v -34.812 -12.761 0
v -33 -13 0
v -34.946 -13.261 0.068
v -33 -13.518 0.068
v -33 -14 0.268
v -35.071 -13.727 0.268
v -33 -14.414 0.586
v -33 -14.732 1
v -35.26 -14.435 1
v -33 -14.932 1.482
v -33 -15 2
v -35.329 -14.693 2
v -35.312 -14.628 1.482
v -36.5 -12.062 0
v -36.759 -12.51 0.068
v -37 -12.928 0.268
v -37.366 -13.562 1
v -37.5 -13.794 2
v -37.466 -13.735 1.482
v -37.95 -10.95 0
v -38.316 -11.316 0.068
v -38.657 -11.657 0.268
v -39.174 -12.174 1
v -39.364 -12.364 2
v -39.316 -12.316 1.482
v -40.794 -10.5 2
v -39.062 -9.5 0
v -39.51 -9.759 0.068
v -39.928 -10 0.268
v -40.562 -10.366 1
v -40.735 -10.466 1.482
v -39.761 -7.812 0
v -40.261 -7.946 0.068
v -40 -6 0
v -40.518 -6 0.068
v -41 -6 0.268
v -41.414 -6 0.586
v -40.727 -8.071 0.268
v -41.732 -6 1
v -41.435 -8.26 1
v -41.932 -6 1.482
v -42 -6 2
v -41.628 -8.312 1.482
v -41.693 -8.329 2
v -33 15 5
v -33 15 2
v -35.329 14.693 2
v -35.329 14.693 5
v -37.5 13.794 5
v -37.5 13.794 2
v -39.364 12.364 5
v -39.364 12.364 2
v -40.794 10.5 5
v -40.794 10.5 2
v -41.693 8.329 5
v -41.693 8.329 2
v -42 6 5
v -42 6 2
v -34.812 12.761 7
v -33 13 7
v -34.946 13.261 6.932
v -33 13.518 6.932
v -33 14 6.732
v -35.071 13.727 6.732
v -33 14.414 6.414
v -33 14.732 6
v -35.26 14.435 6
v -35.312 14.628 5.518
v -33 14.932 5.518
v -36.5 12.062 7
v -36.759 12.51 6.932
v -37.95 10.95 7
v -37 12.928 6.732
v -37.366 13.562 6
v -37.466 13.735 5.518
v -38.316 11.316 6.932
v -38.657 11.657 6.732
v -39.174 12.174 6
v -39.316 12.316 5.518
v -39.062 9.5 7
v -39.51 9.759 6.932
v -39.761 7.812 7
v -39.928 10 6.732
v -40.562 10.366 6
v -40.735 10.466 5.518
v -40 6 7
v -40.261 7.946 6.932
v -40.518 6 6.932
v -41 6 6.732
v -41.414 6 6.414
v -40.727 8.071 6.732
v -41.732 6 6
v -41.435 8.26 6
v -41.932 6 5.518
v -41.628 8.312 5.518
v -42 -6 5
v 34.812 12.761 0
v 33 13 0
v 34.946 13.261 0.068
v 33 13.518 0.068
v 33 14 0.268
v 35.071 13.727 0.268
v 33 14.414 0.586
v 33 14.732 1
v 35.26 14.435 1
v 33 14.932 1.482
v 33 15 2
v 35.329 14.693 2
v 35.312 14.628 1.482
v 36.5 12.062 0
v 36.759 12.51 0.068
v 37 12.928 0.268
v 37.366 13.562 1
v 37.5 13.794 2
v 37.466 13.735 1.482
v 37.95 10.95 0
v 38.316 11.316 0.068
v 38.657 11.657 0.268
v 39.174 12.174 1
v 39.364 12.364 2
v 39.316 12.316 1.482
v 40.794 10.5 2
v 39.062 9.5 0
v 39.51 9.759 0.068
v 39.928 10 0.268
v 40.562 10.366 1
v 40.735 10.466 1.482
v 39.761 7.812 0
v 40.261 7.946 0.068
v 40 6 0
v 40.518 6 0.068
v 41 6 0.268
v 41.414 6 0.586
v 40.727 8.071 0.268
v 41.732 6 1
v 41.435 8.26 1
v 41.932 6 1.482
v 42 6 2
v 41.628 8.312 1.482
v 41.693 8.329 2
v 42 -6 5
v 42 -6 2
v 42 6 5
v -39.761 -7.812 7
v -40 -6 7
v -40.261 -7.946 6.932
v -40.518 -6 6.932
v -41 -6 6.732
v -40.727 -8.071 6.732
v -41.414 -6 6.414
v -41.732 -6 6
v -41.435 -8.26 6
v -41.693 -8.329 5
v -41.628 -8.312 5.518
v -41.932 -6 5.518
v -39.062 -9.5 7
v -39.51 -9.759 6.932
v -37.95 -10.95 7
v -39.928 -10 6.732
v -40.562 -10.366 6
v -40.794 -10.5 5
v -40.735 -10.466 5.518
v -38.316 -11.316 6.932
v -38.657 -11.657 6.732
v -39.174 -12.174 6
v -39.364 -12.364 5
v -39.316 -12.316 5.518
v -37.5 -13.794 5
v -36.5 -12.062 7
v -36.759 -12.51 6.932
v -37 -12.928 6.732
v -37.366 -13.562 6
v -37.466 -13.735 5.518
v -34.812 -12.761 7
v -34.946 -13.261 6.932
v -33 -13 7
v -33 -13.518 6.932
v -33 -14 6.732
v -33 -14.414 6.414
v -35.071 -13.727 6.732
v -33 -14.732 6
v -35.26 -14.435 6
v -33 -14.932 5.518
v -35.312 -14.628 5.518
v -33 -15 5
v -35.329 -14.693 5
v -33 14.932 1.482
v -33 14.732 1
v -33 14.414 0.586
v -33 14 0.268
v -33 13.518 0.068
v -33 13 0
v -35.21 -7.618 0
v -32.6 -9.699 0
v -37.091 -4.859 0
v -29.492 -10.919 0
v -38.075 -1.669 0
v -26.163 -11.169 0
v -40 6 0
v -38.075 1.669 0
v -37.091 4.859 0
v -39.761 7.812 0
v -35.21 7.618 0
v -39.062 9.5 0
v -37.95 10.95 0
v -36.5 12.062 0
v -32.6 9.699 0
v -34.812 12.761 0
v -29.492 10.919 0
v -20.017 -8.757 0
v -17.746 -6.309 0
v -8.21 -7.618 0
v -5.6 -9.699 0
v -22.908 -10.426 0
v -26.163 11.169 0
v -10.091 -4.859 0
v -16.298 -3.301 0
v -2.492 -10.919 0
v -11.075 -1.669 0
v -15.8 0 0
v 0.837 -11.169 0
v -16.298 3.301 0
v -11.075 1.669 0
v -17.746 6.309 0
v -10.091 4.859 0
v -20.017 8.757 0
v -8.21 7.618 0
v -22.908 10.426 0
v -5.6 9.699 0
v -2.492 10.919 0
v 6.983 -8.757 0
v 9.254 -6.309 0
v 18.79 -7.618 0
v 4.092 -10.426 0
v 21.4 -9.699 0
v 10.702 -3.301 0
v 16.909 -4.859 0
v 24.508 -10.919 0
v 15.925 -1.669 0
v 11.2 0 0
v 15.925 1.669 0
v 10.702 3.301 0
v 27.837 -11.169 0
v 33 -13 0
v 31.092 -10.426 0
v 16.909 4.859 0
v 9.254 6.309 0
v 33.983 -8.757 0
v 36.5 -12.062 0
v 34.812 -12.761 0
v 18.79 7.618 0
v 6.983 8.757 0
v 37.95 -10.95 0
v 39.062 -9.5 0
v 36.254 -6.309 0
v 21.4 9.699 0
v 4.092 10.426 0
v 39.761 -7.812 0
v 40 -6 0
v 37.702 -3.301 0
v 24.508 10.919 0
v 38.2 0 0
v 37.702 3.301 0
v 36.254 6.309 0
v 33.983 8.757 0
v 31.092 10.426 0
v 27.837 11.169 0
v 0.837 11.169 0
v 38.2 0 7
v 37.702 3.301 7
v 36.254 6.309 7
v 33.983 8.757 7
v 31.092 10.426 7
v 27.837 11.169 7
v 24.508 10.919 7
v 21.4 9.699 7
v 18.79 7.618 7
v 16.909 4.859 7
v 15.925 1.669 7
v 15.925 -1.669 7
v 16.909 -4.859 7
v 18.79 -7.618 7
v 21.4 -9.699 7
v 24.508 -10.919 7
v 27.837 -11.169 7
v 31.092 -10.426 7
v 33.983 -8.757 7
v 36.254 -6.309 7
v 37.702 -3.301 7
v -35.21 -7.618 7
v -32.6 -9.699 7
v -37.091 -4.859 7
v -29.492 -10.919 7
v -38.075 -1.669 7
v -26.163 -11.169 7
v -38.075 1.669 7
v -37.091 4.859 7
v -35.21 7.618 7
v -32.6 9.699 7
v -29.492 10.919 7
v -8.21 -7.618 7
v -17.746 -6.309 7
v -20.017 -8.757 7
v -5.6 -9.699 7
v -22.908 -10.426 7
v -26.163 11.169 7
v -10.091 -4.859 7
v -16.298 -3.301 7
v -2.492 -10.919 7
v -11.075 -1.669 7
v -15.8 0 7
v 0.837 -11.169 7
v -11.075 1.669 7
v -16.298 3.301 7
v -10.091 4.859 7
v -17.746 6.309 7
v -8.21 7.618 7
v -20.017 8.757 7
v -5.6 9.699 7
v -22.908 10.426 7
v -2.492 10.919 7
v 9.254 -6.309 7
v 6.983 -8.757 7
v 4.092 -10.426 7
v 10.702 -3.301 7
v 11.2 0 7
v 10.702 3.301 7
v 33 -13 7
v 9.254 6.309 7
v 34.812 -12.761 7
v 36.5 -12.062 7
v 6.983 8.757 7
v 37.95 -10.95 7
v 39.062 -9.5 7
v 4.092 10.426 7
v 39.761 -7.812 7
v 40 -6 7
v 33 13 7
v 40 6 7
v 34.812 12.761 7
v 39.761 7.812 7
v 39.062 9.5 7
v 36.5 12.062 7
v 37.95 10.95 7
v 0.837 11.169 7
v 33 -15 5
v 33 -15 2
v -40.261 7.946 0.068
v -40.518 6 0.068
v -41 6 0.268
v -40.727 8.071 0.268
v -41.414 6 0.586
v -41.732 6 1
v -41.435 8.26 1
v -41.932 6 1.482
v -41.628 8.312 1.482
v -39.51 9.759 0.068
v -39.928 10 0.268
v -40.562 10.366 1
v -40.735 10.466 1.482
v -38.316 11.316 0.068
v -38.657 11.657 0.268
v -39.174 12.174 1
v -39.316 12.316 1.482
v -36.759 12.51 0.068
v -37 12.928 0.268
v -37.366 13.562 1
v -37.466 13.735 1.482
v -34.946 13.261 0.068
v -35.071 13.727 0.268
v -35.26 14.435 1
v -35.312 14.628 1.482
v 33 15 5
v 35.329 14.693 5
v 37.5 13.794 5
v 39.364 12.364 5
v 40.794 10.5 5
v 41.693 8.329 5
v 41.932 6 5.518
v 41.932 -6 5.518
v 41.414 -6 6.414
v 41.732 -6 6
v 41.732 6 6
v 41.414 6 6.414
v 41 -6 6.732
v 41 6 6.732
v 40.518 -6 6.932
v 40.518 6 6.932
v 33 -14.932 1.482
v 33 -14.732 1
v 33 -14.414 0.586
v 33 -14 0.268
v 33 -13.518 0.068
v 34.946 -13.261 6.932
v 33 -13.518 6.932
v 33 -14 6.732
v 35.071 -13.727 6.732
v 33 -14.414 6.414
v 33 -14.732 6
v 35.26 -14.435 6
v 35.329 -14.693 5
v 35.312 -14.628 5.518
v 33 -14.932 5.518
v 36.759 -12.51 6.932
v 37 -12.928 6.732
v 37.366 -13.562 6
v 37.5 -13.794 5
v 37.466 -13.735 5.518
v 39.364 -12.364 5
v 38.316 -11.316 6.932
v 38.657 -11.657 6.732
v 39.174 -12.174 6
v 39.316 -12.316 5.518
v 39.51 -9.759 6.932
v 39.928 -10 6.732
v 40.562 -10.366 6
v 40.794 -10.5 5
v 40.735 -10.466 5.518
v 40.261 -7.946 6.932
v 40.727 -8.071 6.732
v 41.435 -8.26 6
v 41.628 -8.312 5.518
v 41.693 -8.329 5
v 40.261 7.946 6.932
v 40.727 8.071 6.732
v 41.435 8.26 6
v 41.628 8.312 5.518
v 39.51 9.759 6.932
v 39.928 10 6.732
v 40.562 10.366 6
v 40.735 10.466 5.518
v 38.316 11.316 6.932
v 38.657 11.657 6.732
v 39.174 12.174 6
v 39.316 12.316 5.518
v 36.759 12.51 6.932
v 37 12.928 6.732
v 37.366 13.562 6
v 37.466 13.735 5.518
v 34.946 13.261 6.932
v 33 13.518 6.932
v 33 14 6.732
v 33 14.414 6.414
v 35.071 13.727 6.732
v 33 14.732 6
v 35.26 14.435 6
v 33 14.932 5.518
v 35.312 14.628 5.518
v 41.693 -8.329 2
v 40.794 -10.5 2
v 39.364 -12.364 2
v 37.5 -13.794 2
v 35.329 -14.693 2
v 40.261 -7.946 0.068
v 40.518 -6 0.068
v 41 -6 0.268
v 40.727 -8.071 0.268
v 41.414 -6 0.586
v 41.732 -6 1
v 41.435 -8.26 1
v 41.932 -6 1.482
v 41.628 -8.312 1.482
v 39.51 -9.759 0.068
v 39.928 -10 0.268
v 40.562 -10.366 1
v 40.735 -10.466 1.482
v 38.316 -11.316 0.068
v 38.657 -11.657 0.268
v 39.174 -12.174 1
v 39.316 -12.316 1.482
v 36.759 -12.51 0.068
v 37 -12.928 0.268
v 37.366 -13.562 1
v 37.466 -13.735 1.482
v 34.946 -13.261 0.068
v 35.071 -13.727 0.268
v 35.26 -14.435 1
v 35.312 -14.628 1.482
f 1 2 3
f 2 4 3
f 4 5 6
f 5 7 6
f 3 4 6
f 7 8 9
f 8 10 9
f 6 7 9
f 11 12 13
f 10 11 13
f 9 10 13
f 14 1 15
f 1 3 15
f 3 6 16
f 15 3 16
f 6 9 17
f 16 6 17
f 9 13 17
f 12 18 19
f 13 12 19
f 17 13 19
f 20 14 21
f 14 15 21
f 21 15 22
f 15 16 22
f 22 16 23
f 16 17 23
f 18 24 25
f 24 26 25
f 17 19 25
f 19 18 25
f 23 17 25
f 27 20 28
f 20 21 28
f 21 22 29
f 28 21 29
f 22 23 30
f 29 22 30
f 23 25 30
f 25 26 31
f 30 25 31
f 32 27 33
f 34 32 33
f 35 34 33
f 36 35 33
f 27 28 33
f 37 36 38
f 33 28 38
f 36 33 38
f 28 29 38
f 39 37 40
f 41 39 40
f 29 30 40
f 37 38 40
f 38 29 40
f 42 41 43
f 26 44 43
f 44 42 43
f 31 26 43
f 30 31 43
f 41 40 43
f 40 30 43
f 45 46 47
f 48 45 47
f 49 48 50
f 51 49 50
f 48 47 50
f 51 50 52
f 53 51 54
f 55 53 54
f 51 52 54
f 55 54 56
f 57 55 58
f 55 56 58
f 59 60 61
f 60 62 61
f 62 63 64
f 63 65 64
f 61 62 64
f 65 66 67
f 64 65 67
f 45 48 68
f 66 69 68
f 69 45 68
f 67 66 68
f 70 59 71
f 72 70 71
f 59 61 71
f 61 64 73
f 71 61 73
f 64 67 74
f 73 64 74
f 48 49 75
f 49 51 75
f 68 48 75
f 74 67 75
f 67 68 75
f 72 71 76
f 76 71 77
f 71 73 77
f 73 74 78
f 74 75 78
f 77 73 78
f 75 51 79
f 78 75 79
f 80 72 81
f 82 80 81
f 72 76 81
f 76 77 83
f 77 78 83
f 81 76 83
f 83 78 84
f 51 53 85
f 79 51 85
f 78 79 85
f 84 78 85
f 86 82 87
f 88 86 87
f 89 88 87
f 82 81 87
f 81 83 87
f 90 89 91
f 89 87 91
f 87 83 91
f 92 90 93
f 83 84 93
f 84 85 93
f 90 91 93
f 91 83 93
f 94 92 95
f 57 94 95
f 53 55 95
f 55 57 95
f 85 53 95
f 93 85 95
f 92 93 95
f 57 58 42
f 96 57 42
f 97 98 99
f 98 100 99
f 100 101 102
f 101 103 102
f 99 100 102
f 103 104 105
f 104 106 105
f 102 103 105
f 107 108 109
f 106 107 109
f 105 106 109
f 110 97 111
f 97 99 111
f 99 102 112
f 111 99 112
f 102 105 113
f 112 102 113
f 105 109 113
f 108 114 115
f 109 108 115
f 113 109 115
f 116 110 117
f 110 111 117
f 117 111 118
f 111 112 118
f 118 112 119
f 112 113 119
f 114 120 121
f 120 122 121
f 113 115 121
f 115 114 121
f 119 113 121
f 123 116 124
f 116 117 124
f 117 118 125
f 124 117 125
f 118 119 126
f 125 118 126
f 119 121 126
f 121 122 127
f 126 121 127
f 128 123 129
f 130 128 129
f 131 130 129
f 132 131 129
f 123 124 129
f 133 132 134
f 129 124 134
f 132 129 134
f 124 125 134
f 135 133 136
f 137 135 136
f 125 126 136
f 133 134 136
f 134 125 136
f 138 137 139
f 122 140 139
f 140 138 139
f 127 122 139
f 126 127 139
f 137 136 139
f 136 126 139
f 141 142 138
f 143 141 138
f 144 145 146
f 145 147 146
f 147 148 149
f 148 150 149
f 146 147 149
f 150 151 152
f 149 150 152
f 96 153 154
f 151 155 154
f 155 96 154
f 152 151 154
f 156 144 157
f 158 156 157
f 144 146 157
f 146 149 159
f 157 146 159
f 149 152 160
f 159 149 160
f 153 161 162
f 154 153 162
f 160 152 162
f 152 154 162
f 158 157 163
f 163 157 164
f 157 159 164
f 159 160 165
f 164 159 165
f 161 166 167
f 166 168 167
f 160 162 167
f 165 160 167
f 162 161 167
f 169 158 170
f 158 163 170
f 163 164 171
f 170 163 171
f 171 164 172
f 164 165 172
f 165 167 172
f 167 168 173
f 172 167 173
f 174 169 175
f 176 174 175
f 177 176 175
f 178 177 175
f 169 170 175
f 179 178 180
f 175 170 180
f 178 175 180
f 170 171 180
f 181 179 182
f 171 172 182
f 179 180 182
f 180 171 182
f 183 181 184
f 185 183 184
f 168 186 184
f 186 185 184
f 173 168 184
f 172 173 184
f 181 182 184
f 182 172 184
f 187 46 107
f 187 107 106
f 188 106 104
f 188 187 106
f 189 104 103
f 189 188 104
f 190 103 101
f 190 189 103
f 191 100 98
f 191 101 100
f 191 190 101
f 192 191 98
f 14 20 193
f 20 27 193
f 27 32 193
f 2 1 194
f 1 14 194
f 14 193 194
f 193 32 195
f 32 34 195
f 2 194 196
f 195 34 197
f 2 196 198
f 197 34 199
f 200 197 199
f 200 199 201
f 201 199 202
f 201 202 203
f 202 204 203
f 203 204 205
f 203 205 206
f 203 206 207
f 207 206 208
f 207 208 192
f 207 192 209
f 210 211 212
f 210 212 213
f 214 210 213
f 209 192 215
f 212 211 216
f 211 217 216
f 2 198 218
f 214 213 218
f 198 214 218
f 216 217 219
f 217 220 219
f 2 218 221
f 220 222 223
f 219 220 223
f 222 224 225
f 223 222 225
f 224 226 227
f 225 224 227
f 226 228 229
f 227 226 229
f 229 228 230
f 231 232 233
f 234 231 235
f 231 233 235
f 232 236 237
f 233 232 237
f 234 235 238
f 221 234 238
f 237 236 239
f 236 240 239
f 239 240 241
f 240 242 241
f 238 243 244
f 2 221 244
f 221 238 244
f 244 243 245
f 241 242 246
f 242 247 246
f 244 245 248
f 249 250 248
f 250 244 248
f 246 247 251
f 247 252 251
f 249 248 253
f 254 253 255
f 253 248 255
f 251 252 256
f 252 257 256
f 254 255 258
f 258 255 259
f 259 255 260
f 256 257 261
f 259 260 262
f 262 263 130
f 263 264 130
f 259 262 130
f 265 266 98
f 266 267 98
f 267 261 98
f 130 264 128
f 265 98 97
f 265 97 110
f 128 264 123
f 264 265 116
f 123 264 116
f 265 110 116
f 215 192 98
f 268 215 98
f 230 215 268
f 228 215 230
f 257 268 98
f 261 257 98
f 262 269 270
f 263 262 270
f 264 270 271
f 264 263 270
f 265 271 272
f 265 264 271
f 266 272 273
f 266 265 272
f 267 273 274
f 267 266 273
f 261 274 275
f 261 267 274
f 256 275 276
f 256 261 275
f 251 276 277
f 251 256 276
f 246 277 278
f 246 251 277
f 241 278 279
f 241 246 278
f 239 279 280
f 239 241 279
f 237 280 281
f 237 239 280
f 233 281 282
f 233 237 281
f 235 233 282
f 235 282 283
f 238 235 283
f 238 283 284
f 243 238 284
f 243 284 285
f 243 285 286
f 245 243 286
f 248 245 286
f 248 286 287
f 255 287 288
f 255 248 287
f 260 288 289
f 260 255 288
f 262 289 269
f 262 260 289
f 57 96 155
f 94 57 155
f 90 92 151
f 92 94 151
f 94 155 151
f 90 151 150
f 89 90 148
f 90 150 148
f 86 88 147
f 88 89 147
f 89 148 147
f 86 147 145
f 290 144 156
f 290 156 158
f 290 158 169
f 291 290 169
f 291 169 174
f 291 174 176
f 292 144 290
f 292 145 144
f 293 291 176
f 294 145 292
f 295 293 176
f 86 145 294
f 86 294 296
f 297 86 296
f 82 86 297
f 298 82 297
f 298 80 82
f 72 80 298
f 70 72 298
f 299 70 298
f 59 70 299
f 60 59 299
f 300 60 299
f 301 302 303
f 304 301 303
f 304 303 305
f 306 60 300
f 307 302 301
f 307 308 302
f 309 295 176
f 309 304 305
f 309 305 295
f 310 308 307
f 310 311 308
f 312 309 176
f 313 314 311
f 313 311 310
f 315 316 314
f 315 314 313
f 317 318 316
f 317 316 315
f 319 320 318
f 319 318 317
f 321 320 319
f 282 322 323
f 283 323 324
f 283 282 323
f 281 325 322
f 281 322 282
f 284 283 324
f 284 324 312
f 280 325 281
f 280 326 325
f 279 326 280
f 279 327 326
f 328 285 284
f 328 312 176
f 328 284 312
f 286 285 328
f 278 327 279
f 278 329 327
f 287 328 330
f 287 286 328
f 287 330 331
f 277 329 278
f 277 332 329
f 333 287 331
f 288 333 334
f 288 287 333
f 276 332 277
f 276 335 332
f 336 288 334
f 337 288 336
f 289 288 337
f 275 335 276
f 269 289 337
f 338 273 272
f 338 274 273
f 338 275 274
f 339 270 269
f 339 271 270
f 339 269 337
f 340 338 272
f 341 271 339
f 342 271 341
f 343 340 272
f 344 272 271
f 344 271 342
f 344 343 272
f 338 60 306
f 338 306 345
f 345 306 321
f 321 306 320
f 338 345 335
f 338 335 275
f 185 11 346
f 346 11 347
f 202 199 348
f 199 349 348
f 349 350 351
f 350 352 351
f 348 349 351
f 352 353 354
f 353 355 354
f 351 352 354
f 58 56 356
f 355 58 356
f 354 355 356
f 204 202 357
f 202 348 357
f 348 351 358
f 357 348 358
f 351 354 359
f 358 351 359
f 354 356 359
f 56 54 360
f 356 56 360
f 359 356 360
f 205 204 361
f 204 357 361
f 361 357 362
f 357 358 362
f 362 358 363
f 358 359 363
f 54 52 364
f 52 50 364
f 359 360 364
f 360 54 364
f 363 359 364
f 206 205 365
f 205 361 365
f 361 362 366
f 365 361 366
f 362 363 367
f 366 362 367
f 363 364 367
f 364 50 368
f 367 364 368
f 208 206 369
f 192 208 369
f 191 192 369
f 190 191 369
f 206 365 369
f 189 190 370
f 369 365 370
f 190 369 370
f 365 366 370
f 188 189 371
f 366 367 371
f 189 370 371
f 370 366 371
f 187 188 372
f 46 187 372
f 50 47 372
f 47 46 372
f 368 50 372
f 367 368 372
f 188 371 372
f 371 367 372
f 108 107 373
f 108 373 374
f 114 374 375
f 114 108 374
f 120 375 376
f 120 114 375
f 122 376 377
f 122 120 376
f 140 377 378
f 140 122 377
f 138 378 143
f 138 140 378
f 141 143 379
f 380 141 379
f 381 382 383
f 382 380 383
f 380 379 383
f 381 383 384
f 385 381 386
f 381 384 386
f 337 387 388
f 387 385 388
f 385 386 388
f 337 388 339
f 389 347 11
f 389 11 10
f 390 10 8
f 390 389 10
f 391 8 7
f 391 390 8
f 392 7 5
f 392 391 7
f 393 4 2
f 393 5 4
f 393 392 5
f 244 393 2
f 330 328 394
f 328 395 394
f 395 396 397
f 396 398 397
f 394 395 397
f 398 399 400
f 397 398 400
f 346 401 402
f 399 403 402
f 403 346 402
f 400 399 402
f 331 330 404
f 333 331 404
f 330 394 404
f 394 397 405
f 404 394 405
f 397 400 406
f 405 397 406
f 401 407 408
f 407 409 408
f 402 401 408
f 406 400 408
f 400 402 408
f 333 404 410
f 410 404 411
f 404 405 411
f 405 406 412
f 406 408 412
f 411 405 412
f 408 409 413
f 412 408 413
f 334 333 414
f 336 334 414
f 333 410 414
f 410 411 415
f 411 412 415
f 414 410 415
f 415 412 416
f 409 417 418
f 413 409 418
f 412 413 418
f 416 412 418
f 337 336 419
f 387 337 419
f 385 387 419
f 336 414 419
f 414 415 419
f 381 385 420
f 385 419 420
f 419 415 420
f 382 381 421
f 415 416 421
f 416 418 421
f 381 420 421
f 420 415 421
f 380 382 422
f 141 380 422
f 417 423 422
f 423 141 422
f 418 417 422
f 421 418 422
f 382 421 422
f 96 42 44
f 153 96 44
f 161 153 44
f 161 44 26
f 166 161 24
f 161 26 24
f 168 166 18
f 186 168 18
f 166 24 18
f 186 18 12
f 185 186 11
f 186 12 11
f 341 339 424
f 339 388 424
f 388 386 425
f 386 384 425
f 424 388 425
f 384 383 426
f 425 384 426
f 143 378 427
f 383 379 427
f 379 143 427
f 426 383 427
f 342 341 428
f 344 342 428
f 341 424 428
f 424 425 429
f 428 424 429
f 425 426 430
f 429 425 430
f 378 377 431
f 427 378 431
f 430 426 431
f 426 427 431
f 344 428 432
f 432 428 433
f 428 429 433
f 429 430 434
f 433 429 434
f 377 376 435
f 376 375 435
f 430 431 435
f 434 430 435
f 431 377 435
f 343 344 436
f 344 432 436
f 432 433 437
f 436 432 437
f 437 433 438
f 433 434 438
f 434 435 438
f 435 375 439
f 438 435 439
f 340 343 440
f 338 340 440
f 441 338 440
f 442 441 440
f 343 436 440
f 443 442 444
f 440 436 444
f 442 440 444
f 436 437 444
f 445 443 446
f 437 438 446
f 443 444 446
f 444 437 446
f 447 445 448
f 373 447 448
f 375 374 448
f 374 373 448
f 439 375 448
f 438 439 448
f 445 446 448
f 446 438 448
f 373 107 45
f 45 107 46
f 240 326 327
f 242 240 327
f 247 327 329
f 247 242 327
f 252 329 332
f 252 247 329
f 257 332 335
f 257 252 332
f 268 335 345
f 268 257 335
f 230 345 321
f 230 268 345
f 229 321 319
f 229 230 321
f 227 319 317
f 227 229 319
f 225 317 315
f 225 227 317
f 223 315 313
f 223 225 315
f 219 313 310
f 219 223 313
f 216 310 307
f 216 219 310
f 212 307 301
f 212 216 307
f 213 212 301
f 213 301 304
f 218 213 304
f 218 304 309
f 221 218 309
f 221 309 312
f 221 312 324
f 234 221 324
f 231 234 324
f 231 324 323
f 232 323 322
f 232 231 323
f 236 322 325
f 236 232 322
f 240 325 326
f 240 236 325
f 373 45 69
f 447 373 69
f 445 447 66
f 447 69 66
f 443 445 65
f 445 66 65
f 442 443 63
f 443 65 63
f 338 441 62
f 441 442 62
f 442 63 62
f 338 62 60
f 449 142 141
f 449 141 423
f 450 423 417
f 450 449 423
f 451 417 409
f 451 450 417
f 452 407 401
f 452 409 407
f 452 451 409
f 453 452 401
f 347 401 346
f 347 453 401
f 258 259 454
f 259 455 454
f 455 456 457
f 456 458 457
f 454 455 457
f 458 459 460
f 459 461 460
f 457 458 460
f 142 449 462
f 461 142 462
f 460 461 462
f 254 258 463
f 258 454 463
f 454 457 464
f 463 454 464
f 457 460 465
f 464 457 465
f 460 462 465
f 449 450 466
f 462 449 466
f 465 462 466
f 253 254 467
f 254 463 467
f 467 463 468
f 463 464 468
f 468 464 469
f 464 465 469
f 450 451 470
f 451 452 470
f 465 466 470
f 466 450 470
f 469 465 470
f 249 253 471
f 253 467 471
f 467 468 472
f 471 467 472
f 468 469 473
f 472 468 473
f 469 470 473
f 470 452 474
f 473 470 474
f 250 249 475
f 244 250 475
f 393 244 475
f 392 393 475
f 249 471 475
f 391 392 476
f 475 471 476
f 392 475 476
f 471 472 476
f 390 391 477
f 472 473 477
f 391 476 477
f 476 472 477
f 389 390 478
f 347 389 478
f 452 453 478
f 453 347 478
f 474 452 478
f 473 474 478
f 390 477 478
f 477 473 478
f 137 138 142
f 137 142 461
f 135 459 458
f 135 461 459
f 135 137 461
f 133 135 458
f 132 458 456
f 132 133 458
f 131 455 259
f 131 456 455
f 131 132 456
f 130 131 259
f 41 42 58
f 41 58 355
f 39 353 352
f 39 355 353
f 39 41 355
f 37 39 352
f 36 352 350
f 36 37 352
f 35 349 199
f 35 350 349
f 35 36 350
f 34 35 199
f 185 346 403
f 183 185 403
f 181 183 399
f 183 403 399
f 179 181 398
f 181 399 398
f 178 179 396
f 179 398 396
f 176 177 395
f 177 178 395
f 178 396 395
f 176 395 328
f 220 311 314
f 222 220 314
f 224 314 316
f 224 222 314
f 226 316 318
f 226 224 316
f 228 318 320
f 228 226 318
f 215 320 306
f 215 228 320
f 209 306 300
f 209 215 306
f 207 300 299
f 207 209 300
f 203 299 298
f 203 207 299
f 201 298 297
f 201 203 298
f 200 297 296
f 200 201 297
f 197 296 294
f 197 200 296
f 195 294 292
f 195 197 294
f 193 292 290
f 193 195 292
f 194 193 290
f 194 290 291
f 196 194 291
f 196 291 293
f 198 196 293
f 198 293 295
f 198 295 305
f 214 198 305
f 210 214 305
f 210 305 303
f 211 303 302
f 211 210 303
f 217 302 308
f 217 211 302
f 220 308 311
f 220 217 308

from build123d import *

# Parameters (mm, degrees)
F0_R         = 11.2
F1_DEPTH     = 7
F2_R         = 2
F3_T1_DEPTH  = 7
F3_T4_ANGLE  = 90
F3_T6_ANGLE  = 90
F3_T8_ANGLE  = 90
F3_T10_ANGLE = 90
F3_T12_ANGLE = 90
F3_T14_ANGLE = 90
F3_T16_ANGLE = 90
F3_T18_ANGLE = 90


# Not quite as in the source:
# - a fillet or chamfer that OpenCascade refuses, or shapes differently, is made with other operations: its cross-section is extruded or revolved along the edge and cut away or added


with BuildPart() as f1:
    # F0 (on Top) → F1 (new body)
    with BuildSketch(Plane.XY):
        Polygon((42, 15), (0, 15), (-42, 15), (-42, -15), (42, -15), align=None)
        with Locations((-27, 0)):
            Circle(F0_R, mode=Mode.SUBTRACT)
        Circle(F0_R, mode=Mode.SUBTRACT)
        with Locations((27, 0)):
            Circle(F0_R, mode=Mode.SUBTRACT)
    extrude(amount=F1_DEPTH)

    # F2
    f2_edges = [f1.edges().sort_by_distance(p)[0] for p in [
        (0, 15, 7),
        (-42, 0, 7),
        (0, -15, 7),
        (42, 0, 7),
        (42, 0, 0),
        (0, 15, 0),
        (-42, 0, 0),
        (0, -15, 0),
    ]]
    fillet(f2_edges, radius=F2_R)

    # F3: fillet of radius 9 on 4 edges, made by hand

    # F3_s2 → F3_t1 (cut)
    with BuildSketch(Plane.XY):
        with BuildLine():
            ThreePointArc((-33, 15), (-39.3639610307, 12.3639610307), (-42, 6))
            Line((-42, 6), (-42, 15))
            Line((-42, 15), (-33, 15))
        make_face()
        with BuildLine():
            ThreePointArc((-42, -6), (-39.3639610307, -12.3639610307), (-33, -15))
            Line((-33, -15), (-42, -15))
            Line((-42, -15), (-42, -6))
        make_face()
        with BuildLine():
            ThreePointArc((42, -6), (39.3639610307, -12.3639610307), (33, -15))
            Line((33, -15), (42, -15))
            Line((42, -15), (42, -6))
        make_face()
        with BuildLine():
            ThreePointArc((33, 15), (39.3639610307, 12.3639610307), (42, 6))
            Line((42, 6), (42, 15))
            Line((42, 15), (33, 15))
        make_face()
    extrude(amount=F3_T1_DEPTH, mode=Mode.SUBTRACT)

    # F3_s3 → F3_t4 (revolve, cut)
    with BuildSketch(Plane.YZ.offset(33)):
        with BuildLine():
            ThreePointArc((13, 0), (14.4142135624, 0.5857864376), (15, 2))
            Line((15, 2), (15, 0))
            Line((15, 0), (13, 0))
        make_face()
    revolve(axis=Axis((33, 6, 0), (0, 0, -1)), revolution_arc=F3_T4_ANGLE, mode=Mode.SUBTRACT)

    # F3_s5 → F3_t6 (revolve, cut)
    with BuildSketch(Plane.XZ.offset(-6)):
        with BuildLine():
            ThreePointArc((40, 7), (41.4142135624, 6.4142135624), (42, 5))
            Line((42, 5), (42, 7))
            Line((42, 7), (40, 7))
        make_face()
    revolve(axis=Axis((33, 6, 7), (0, 0, 1)), revolution_arc=F3_T6_ANGLE, mode=Mode.SUBTRACT)

    # F3_s7 → F3_t8 (revolve, cut)
    with BuildSketch(Plane.XZ.offset(6)):
        with BuildLine():
            ThreePointArc((40, 0), (41.4142135624, 0.5857864376), (42, 2))
            Line((42, 2), (42, 0))
            Line((42, 0), (40, 0))
        make_face()
    revolve(axis=Axis((33, -6, 0), (0, 0, -1)), revolution_arc=F3_T8_ANGLE, mode=Mode.SUBTRACT)

    # F3_s9 → F3_t10 (revolve, cut)
    with BuildSketch(Plane.YZ.offset(33)):
        with BuildLine():
            ThreePointArc((-13, 7), (-14.4142135624, 6.4142135624), (-15, 5))
            Line((-15, 5), (-15, 7))
            Line((-15, 7), (-13, 7))
        make_face()
    revolve(axis=Axis((33, -6, 7), (0, 0, 1)), revolution_arc=F3_T10_ANGLE, mode=Mode.SUBTRACT)

    # F3_s11 → F3_t12 (revolve, cut)
    with BuildSketch(Plane.YZ.offset(-33)):
        with BuildLine():
            ThreePointArc((-13, 0), (-14.4142135624, 0.5857864376), (-15, 2))
            Line((-15, 2), (-15, 0))
            Line((-15, 0), (-13, 0))
        make_face()
    revolve(axis=Axis((-33, -6, 0), (0, 0, -1)), revolution_arc=F3_T12_ANGLE, mode=Mode.SUBTRACT)

    # F3_s13 → F3_t14 (revolve, cut)
    with BuildSketch(Plane.XZ.offset(6)):
        with BuildLine():
            ThreePointArc((-40, 7), (-41.4142135624, 6.4142135624), (-42, 5))
            Line((-42, 5), (-42, 7))
            Line((-42, 7), (-40, 7))
        make_face()
    revolve(axis=Axis((-33, -6, 7), (0, 0, 1)), revolution_arc=F3_T14_ANGLE, mode=Mode.SUBTRACT)

    # F3_s15 → F3_t16 (revolve, cut)
    with BuildSketch(Plane.XZ.offset(-6)):
        with BuildLine():
            ThreePointArc((-40, 0), (-41.4142135624, 0.5857864376), (-42, 2))
            Line((-42, 2), (-42, 0))
            Line((-42, 0), (-40, 0))
        make_face()
    revolve(axis=Axis((-33, 6, 0), (0, 0, -1)), revolution_arc=F3_T16_ANGLE, mode=Mode.SUBTRACT)

    # F3_s17 → F3_t18 (revolve, cut)
    with BuildSketch(Plane.YZ.offset(-33)):
        with BuildLine():
            ThreePointArc((13, 7), (14.4142135624, 6.4142135624), (15, 5))
            Line((15, 5), (15, 7))
            Line((15, 7), (13, 7))
        make_face()
    revolve(axis=Axis((-33, 6, 7), (0, 0, 1)), revolution_arc=F3_T18_ANGLE, mode=Mode.SUBTRACT)


solid = f1.part
